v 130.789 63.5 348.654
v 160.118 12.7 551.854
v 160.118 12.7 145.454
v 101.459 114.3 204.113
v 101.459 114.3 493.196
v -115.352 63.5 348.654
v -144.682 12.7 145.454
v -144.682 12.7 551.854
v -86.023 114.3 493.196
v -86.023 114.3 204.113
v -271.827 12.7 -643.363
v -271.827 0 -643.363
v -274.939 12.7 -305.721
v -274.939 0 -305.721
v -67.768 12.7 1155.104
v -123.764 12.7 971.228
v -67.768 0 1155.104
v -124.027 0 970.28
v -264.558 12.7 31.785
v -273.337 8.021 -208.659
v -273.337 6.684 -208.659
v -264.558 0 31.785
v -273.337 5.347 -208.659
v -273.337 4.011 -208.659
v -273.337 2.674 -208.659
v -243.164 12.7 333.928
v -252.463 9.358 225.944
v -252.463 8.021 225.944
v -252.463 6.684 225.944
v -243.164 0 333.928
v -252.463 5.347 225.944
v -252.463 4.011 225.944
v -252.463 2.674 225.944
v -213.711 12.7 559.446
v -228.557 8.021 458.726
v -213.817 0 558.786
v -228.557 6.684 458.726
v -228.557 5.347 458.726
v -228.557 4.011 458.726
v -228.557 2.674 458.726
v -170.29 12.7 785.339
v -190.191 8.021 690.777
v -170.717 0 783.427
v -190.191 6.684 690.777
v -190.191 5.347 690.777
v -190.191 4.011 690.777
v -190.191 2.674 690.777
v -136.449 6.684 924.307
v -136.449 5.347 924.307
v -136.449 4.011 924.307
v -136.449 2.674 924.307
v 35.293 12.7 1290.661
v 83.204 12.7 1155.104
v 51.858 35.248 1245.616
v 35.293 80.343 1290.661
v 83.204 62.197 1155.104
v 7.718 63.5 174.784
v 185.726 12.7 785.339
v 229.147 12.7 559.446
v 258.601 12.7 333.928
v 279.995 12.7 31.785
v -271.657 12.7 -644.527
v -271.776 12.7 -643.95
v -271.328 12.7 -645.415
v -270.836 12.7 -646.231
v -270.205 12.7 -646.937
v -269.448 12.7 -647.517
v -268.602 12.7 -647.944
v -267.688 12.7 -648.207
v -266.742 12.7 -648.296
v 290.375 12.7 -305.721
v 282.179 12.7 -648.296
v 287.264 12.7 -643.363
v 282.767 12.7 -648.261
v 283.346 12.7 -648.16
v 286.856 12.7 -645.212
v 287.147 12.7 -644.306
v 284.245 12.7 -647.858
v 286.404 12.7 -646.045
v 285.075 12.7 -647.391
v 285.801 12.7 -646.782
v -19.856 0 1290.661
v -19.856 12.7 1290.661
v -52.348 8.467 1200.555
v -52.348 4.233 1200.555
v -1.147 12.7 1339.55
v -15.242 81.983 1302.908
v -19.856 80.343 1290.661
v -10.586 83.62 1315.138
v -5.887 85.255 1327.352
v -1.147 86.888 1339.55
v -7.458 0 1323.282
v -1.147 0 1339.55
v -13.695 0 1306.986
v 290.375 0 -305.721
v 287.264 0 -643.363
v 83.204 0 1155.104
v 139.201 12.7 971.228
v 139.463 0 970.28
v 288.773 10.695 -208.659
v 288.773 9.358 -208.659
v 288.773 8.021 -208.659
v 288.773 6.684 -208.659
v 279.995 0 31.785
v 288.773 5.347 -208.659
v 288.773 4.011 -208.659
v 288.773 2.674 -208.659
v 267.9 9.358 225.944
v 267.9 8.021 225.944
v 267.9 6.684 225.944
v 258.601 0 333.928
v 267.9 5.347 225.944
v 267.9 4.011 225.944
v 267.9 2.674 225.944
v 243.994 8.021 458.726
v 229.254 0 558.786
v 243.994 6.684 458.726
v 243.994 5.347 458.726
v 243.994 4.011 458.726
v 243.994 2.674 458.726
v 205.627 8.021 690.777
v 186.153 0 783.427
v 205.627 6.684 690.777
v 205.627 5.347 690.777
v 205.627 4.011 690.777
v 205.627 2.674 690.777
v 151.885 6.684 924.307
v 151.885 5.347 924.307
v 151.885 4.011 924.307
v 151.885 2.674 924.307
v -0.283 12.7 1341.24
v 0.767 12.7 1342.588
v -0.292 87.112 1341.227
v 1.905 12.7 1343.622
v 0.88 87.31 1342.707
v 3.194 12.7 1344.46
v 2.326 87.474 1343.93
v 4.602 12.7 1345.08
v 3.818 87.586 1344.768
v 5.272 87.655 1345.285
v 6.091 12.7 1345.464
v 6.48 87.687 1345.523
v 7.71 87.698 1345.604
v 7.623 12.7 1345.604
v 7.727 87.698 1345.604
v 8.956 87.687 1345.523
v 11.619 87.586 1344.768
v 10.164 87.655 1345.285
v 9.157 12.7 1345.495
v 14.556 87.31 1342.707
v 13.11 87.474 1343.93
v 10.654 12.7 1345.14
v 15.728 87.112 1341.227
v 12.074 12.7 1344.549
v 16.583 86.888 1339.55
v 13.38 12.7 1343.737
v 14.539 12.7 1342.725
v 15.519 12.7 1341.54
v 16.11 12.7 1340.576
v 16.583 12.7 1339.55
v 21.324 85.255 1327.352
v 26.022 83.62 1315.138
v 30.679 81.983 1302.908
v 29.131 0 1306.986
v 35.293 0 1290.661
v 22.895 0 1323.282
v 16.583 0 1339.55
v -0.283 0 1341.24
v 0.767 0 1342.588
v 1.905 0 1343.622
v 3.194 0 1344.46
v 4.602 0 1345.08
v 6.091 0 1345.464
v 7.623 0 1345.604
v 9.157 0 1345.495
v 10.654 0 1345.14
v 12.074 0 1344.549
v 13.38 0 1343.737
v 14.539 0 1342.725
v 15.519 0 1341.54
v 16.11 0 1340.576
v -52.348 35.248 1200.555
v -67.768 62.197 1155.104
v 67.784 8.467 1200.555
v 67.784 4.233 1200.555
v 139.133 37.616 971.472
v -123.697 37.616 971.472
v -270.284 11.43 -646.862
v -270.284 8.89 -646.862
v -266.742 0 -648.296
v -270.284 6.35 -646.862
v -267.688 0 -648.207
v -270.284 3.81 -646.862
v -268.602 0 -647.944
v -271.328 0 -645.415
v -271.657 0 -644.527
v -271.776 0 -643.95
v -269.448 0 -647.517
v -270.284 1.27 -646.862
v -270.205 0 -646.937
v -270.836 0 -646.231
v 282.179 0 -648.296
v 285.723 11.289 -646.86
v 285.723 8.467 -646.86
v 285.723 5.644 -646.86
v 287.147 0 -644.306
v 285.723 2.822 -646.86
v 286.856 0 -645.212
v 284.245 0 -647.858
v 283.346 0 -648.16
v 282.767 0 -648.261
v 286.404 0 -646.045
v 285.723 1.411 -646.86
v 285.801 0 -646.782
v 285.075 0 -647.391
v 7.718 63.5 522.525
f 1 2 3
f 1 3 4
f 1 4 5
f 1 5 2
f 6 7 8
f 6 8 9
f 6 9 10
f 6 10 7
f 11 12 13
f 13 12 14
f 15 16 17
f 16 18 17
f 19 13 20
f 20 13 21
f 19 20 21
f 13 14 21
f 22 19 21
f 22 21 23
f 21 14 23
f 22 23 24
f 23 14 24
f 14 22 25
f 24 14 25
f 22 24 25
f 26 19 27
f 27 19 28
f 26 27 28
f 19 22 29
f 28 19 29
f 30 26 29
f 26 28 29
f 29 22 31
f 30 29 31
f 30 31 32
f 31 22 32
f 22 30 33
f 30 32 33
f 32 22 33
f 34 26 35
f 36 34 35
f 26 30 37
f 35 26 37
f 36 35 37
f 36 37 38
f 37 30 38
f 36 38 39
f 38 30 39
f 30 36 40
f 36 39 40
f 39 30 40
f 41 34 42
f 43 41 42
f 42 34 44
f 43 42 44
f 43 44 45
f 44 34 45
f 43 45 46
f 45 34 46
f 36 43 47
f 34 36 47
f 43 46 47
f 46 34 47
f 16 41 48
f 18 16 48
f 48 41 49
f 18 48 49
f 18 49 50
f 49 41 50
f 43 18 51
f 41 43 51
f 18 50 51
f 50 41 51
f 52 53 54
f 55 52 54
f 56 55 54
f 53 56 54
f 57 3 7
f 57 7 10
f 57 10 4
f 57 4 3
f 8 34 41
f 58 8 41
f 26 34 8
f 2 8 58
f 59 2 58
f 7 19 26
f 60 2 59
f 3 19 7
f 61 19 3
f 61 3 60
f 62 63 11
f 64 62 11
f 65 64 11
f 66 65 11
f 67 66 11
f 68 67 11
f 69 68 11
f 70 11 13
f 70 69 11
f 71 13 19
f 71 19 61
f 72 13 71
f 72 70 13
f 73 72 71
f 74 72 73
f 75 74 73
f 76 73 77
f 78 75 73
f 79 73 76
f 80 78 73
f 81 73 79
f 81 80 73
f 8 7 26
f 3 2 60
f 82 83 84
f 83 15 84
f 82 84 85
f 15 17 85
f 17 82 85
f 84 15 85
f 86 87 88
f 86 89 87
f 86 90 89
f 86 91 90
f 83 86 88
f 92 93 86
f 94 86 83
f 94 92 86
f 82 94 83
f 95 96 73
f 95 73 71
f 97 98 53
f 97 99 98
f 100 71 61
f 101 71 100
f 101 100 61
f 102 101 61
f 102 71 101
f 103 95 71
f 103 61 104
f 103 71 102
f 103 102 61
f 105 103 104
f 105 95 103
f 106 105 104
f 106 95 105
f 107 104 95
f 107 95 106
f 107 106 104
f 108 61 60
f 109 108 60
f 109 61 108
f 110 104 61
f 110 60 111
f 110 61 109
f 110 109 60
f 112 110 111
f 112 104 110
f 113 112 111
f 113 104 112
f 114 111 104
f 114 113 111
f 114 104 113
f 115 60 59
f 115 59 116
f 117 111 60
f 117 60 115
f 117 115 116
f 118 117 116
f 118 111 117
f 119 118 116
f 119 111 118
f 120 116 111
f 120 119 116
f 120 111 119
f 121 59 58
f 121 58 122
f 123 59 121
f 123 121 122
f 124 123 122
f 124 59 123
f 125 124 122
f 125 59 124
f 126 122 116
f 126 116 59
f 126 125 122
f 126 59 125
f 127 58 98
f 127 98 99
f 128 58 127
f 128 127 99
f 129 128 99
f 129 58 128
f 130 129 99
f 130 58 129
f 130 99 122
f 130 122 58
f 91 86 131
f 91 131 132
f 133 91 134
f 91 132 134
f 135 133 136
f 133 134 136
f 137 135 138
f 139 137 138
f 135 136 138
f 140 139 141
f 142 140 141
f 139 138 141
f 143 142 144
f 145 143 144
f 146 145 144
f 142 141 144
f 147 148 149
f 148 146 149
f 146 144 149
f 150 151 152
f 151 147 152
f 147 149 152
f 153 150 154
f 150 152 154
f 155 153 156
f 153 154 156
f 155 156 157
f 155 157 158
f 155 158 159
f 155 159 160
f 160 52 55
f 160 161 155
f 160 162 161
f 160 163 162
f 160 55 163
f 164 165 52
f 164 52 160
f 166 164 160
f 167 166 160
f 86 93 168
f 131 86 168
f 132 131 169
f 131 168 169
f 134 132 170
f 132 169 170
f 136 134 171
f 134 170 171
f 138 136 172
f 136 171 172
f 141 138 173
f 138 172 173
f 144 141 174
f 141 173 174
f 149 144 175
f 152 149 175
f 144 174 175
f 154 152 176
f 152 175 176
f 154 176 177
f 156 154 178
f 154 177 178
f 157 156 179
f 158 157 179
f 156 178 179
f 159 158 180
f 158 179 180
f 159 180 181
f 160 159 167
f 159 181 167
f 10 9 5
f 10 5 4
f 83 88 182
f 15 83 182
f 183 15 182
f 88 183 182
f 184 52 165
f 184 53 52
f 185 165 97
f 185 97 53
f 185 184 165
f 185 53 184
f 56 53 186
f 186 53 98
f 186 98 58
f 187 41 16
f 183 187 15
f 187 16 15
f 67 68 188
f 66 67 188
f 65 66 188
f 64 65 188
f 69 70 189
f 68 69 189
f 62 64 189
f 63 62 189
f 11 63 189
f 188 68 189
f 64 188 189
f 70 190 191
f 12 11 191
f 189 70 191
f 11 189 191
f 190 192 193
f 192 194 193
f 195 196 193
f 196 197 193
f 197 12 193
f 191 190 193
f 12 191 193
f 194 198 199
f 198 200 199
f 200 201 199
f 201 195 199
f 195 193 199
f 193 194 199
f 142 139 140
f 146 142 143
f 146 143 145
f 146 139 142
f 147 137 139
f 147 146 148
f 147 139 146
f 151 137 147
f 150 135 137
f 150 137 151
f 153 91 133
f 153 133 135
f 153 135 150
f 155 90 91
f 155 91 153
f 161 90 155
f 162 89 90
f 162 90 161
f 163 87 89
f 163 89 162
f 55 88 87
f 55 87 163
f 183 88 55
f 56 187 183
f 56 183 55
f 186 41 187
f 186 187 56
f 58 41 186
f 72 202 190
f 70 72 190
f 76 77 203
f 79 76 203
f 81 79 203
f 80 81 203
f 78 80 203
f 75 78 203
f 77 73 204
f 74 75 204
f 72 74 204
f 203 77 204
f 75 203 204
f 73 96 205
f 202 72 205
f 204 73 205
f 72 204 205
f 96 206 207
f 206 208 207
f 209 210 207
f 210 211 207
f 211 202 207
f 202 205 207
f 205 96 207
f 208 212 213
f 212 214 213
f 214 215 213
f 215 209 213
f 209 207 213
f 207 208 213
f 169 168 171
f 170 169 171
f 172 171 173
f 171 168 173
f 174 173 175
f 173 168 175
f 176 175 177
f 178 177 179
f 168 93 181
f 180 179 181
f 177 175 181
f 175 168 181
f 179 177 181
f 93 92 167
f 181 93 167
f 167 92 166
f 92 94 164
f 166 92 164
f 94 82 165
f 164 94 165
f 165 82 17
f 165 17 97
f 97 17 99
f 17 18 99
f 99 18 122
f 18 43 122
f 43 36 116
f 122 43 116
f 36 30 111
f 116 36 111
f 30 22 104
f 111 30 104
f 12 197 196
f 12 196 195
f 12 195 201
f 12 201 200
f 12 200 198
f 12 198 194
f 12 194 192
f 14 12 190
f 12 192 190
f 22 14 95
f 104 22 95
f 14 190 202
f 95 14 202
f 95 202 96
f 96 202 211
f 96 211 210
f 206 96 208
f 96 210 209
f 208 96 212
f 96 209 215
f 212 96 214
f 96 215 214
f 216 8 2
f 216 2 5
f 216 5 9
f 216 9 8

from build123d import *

# Parameters (mm, degrees)
BOSS_EXTRUDE1_DEPTH     = 12.7
SKETCH2_W               = 304.8
SKETCH2_H               = 406.4
BOSS_EXTRUDE2_DEPTH     = 101.6
BOSS_EXTRUDE2_TAPER     = 30
BOSS_EXTRUDE3_DEPTH     = 74.997994
SKETCH7_W               = 508
SKETCH7_H               = 565.262345734
CUT_EXTRUDE_THIN1_DEPTH = 88.9


with BuildPart() as part:
    # Sketch1 → Boss-Extrude1 (new body)
    with BuildSketch(Plane(origin=(0, 0, 0), x_dir=(1, 0, 0), z_dir=(0, 1, 0))):
        with BuildLine():
            Line((282.178632733, 648.295571298), (-266.742186919, 648.295571298))
            add(Edge.make_bspline(
                [(-266.742186919, 648.295571298), (-267.071605745, 648.295571298), (-267.395635709, 648.263919559), (-267.873929001, 648.170912239), (-268.032058898, 648.132267139), (-268.345661652, 648.039370684), (-268.50177233, 647.984795184), (-268.956632468, 647.800648785), (-269.244615581, 647.650355056), (-269.790494311, 647.295478174), (-270.050162442, 647.088526762), (-270.517954254, 646.635397593), (-270.728625138, 646.388172726), (-271.009326112, 645.985928841), (-271.097290935, 645.845887253), (-271.257701503, 645.560682787), (-271.330552726, 645.415064516), (-271.527511364, 644.969353179), (-271.630228502, 644.660487559), (-271.776102581, 644.018329571), (-271.817451265, 643.692751749), (-271.827054921, 643.363460144)],
                knots=[0, 0, 0, 0, 0.125, 0.125, 0.1875, 0.1875, 0.25, 0.25, 0.375, 0.375, 0.5, 0.5, 0.625, 0.625, 0.6875, 0.6875, 0.75, 0.75, 0.875, 0.875, 1, 1, 1, 1], degree=3))
            add(Edge.make_bspline(
                [(-271.827054921, 643.363460144), (-275.619083406, 513.341805118), (-276.544805746, 362.627319415), (-273.085954654, 195.044872043), (-271.031571931, 119.847777975), (-268.671598158, 56.063015866), (-263.132069886, -66.069662637), (-257.433335824, -160.037587725), (-250.764013725, -248.746196584), (-248.487290338, -276.985560905), (-240.18277645, -371.092813978), (-227.549965864, -472.778666072), (-212.610504693, -566.462025361), (-203.222738687, -622.637020096), (-193.844144823, -673.237560968), (-182.290724358, -729.93756534), (-174.271233518, -767.830757671), (-162.896711093, -818.371776774), (-149.252675491, -874.959703685), (-120.211836445, -987.796815407), (-92.347727316, -1081.139961257), (-67.767522398, -1155.104428702)],
                knots=[0.00273139, 0.00273139, 0.00273139, 0.00273139, 0.21875, 0.253283969, 0.28125, 0.34375, 0.359375, 0.484375, 0.5, 0.506595501, 0.53125, 0.65625, 0.67558323, 0.6875, 0.75, 0.760136029, 0.78125, 0.8125, 0.84375, 0.875, 1, 1, 1, 1], degree=3))
            add(Edge.make_bspline(
                [(-67.767522398, -1155.104428702), (-52.556679091, -1200.875484247), (-36.785485559, -1245.497662336), (-19.856460022, -1290.661446214)],
                knots=[0, 0, 0, 0, 1, 1, 1, 1], degree=3))
            ThreePointArc((-19.856460022, -1290.661446214), (-10.585699255, -1315.137822671), (-1.146808464, -1339.549855571))
            add(Edge.make_bspline(
                [(-1.146808464, -1339.549855571), (-0.800991585, -1340.435186307), (0.157660597, -1342.101440742), (2.269639684, -1344.064855704), (4.866902728, -1345.317723875), (6.767749431, -1345.604428702), (7.718222907, -1345.604428702)],
                knots=[0.808269867, 0.808269867, 0.808269867, 0.808269867, 0.8562024, 0.904134933, 0.952067467, 0.99999997, 0.99999997, 0.99999997, 0.99999997], degree=3))
            add(Edge.make_bspline(
                [(16.583254278, -1339.549855571), (16.237437398, -1340.435186307), (15.278785216, -1342.101440742), (13.16680613, -1344.064855704), (10.569543086, -1345.317723875), (8.668696382, -1345.604428702), (7.718222907, -1345.604428702)],
                knots=[0.808269867, 0.808269867, 0.808269867, 0.808269867, 0.8562024, 0.904134933, 0.952067467, 1, 1, 1, 1], degree=3))
            ThreePointArc((16.583254278, -1339.549855571), (26.022145069, -1315.137822671), (35.292905835, -1290.661446214))
            add(Edge.make_bspline(
                [(83.203968212, -1155.104428702), (67.993124905, -1200.875484247), (52.221931373, -1245.497662336), (35.292905835, -1290.661446214)],
                knots=[0, 0, 0, 0, 1, 1, 1, 1], degree=3))
            add(Edge.make_bspline(
                [(287.263500734, 643.363460144), (291.055529219, 513.341805118), (291.98125156, 362.627319415), (288.522400468, 195.044872043), (286.468017744, 119.847777975), (284.108043971, 56.063015866), (278.568515699, -66.069662637), (272.869781637, -160.037587725), (266.200459538, -248.746196584), (263.923736151, -276.985560905), (255.619222264, -371.092813978), (242.986411678, -472.778666072), (228.046950506, -566.462025361), (218.659184501, -622.637020096), (209.280590637, -673.237560968), (197.727170171, -729.93756534), (189.707679331, -767.830757671), (178.333156907, -818.371776774), (164.689121304, -874.959703685), (135.648282259, -987.796815407), (107.78417313, -1081.139961257), (83.203968212, -1155.104428702)],
                knots=[0.00273139, 0.00273139, 0.00273139, 0.00273139, 0.21875, 0.253283969, 0.28125, 0.34375, 0.359375, 0.484375, 0.5, 0.506595501, 0.53125, 0.65625, 0.67558323, 0.6875, 0.75, 0.760136029, 0.78125, 0.8125, 0.84375, 0.875, 1, 1, 1, 1], degree=3))
            add(Edge.make_bspline(
                [(287.263500734, 643.363460144), (287.253897353, 643.692742337), (287.212682478, 644.015685877), (287.105404307, 644.490986496), (287.062014477, 644.64789), (286.959654545, 644.958572893), (286.900349557, 645.112951735), (286.70240916, 645.561902127), (286.54331042, 645.845111412), (286.171615525, 646.379810232), (285.956670805, 646.632890984), (285.489257001, 647.086264872), (285.235568792, 647.289160564), (284.824662826, 647.557338937), (284.681966904, 647.640918903), (284.392063507, 647.792397056), (284.244309066, 647.860727323), (283.491814956, 648.166105966), (282.837451466, 648.295571298), (282.178632733, 648.295571298)],
                knots=[0, 0, 0, 0, 0.125, 0.125, 0.1875, 0.1875, 0.25, 0.25, 0.375, 0.375, 0.5, 0.5, 0.625, 0.625, 0.6875, 0.6875, 0.75, 0.75, 1, 1, 1, 1], degree=3))
        make_face()
    extrude(amount=BOSS_EXTRUDE1_DEPTH)

    # Sketch2 → Boss-Extrude2 (add)
    with BuildSketch(Plane(origin=(0, 12.7, 0), x_dir=(1, 0, 0), z_dir=(0, 1, 0))):
        with Locations((7.718222907, -348.654428702)):
            Rectangle(SKETCH2_W, SKETCH2_H)
    extrude(amount=BOSS_EXTRUDE2_DEPTH, taper=BOSS_EXTRUDE2_TAPER)

    # Sketch4 → Boss-Extrude3 (add)
    with BuildSketch(Plane(origin=(0, 12.7, 0), x_dir=(1, 0, 0), z_dir=(0, 1, 0))):
        with BuildLine():
            Line((-170.289770142, -785.339473227), (185.726215956, -785.339473227))
            add(Edge.make_bspline(
                [(83.203968212, -1155.104428702), (107.78417313, -1081.139961257), (135.648282259, -987.796815407), (164.689121304, -874.959703685), (176.435611281, -826.241748411), (183.262218235, -796.353082345), (185.726215956, -785.339473227)],
                knots=[0.00273139, 0.00273139, 0.00273139, 0.00273139, 0.12773139, 0.15898139, 0.19023139, 0.208443099, 0.208443099, 0.208443099, 0.208443099], degree=3))
            add(Edge.make_bspline(
                [(35.292905835, -1290.661446214), (52.221931373, -1245.497662336), (67.993124905, -1200.875484247), (83.203968212, -1155.104428702)],
                knots=[0, 0, 0, 0, 1, 1, 1, 1], degree=3))
            ThreePointArc((35.292905835, -1290.661446214), (26.022145069, -1315.137822671), (16.583254278, -1339.549855571))
            add(Edge.make_bspline(
                [(7.718222907, -1345.604428702), (8.668696382, -1345.604428702), (10.569543086, -1345.317723875), (13.16680613, -1344.064855704), (15.278785216, -1342.101440742), (16.237437398, -1340.435186307), (16.583254278, -1339.549855571)],
                knots=[0.808269867, 0.808269867, 0.808269867, 0.808269867, 0.8562024, 0.904134933, 0.952067467, 1, 1, 1, 1], degree=3))
            add(Edge.make_bspline(
                [(-1.146808464, -1339.549855571), (-0.800991585, -1340.435186307), (0.157660597, -1342.101440742), (2.269639684, -1344.064855704), (4.866902728, -1345.317723875), (6.767749431, -1345.604428702), (7.718222907, -1345.604428702)],
                knots=[0.808269867, 0.808269867, 0.808269867, 0.808269867, 0.8562024, 0.904134933, 0.952067467, 0.99999997, 0.99999997, 0.99999997, 0.99999997], degree=3))
            ThreePointArc((-1.146808464, -1339.549855571), (-10.585699255, -1315.137822671), (-19.856460022, -1290.661446214))
            add(Edge.make_bspline(
                [(-67.767522398, -1155.104428702), (-52.556679091, -1200.875484247), (-36.785485559, -1245.497662336), (-19.856460022, -1290.661446214)],
                knots=[0, 0, 0, 0, 1, 1, 1, 1], degree=3))
            add(Edge.make_bspline(
                [(-170.289770142, -785.339473227), (-167.825772422, -796.353082345), (-160.999165467, -826.241748411), (-149.252675491, -874.959703685), (-120.211836445, -987.796815407), (-92.347727316, -1081.139961257), (-67.767522398, -1155.104428702)],
                knots=[0.794288291, 0.794288291, 0.794288291, 0.794288291, 0.8125, 0.84375, 0.875, 1, 1, 1, 1], degree=3))
        make_face()
    extrude(amount=BOSS_EXTRUDE3_DEPTH)

    # Sketch7 → Cut-Extrude-Thin1 (cut)
    with BuildSketch(Plane(origin=(0, -90.799805475, 12.154612278), x_dir=(1, 0, 0), z_dir=(0, 0.991159167, -0.132678207))):
        with Locations((7.718222907, -1062.71260383)):
            Rectangle(SKETCH7_W, SKETCH7_H)
    extrude(amount=CUT_EXTRUDE_THIN1_DEPTH, mode=Mode.SUBTRACT)


solid = part.part
